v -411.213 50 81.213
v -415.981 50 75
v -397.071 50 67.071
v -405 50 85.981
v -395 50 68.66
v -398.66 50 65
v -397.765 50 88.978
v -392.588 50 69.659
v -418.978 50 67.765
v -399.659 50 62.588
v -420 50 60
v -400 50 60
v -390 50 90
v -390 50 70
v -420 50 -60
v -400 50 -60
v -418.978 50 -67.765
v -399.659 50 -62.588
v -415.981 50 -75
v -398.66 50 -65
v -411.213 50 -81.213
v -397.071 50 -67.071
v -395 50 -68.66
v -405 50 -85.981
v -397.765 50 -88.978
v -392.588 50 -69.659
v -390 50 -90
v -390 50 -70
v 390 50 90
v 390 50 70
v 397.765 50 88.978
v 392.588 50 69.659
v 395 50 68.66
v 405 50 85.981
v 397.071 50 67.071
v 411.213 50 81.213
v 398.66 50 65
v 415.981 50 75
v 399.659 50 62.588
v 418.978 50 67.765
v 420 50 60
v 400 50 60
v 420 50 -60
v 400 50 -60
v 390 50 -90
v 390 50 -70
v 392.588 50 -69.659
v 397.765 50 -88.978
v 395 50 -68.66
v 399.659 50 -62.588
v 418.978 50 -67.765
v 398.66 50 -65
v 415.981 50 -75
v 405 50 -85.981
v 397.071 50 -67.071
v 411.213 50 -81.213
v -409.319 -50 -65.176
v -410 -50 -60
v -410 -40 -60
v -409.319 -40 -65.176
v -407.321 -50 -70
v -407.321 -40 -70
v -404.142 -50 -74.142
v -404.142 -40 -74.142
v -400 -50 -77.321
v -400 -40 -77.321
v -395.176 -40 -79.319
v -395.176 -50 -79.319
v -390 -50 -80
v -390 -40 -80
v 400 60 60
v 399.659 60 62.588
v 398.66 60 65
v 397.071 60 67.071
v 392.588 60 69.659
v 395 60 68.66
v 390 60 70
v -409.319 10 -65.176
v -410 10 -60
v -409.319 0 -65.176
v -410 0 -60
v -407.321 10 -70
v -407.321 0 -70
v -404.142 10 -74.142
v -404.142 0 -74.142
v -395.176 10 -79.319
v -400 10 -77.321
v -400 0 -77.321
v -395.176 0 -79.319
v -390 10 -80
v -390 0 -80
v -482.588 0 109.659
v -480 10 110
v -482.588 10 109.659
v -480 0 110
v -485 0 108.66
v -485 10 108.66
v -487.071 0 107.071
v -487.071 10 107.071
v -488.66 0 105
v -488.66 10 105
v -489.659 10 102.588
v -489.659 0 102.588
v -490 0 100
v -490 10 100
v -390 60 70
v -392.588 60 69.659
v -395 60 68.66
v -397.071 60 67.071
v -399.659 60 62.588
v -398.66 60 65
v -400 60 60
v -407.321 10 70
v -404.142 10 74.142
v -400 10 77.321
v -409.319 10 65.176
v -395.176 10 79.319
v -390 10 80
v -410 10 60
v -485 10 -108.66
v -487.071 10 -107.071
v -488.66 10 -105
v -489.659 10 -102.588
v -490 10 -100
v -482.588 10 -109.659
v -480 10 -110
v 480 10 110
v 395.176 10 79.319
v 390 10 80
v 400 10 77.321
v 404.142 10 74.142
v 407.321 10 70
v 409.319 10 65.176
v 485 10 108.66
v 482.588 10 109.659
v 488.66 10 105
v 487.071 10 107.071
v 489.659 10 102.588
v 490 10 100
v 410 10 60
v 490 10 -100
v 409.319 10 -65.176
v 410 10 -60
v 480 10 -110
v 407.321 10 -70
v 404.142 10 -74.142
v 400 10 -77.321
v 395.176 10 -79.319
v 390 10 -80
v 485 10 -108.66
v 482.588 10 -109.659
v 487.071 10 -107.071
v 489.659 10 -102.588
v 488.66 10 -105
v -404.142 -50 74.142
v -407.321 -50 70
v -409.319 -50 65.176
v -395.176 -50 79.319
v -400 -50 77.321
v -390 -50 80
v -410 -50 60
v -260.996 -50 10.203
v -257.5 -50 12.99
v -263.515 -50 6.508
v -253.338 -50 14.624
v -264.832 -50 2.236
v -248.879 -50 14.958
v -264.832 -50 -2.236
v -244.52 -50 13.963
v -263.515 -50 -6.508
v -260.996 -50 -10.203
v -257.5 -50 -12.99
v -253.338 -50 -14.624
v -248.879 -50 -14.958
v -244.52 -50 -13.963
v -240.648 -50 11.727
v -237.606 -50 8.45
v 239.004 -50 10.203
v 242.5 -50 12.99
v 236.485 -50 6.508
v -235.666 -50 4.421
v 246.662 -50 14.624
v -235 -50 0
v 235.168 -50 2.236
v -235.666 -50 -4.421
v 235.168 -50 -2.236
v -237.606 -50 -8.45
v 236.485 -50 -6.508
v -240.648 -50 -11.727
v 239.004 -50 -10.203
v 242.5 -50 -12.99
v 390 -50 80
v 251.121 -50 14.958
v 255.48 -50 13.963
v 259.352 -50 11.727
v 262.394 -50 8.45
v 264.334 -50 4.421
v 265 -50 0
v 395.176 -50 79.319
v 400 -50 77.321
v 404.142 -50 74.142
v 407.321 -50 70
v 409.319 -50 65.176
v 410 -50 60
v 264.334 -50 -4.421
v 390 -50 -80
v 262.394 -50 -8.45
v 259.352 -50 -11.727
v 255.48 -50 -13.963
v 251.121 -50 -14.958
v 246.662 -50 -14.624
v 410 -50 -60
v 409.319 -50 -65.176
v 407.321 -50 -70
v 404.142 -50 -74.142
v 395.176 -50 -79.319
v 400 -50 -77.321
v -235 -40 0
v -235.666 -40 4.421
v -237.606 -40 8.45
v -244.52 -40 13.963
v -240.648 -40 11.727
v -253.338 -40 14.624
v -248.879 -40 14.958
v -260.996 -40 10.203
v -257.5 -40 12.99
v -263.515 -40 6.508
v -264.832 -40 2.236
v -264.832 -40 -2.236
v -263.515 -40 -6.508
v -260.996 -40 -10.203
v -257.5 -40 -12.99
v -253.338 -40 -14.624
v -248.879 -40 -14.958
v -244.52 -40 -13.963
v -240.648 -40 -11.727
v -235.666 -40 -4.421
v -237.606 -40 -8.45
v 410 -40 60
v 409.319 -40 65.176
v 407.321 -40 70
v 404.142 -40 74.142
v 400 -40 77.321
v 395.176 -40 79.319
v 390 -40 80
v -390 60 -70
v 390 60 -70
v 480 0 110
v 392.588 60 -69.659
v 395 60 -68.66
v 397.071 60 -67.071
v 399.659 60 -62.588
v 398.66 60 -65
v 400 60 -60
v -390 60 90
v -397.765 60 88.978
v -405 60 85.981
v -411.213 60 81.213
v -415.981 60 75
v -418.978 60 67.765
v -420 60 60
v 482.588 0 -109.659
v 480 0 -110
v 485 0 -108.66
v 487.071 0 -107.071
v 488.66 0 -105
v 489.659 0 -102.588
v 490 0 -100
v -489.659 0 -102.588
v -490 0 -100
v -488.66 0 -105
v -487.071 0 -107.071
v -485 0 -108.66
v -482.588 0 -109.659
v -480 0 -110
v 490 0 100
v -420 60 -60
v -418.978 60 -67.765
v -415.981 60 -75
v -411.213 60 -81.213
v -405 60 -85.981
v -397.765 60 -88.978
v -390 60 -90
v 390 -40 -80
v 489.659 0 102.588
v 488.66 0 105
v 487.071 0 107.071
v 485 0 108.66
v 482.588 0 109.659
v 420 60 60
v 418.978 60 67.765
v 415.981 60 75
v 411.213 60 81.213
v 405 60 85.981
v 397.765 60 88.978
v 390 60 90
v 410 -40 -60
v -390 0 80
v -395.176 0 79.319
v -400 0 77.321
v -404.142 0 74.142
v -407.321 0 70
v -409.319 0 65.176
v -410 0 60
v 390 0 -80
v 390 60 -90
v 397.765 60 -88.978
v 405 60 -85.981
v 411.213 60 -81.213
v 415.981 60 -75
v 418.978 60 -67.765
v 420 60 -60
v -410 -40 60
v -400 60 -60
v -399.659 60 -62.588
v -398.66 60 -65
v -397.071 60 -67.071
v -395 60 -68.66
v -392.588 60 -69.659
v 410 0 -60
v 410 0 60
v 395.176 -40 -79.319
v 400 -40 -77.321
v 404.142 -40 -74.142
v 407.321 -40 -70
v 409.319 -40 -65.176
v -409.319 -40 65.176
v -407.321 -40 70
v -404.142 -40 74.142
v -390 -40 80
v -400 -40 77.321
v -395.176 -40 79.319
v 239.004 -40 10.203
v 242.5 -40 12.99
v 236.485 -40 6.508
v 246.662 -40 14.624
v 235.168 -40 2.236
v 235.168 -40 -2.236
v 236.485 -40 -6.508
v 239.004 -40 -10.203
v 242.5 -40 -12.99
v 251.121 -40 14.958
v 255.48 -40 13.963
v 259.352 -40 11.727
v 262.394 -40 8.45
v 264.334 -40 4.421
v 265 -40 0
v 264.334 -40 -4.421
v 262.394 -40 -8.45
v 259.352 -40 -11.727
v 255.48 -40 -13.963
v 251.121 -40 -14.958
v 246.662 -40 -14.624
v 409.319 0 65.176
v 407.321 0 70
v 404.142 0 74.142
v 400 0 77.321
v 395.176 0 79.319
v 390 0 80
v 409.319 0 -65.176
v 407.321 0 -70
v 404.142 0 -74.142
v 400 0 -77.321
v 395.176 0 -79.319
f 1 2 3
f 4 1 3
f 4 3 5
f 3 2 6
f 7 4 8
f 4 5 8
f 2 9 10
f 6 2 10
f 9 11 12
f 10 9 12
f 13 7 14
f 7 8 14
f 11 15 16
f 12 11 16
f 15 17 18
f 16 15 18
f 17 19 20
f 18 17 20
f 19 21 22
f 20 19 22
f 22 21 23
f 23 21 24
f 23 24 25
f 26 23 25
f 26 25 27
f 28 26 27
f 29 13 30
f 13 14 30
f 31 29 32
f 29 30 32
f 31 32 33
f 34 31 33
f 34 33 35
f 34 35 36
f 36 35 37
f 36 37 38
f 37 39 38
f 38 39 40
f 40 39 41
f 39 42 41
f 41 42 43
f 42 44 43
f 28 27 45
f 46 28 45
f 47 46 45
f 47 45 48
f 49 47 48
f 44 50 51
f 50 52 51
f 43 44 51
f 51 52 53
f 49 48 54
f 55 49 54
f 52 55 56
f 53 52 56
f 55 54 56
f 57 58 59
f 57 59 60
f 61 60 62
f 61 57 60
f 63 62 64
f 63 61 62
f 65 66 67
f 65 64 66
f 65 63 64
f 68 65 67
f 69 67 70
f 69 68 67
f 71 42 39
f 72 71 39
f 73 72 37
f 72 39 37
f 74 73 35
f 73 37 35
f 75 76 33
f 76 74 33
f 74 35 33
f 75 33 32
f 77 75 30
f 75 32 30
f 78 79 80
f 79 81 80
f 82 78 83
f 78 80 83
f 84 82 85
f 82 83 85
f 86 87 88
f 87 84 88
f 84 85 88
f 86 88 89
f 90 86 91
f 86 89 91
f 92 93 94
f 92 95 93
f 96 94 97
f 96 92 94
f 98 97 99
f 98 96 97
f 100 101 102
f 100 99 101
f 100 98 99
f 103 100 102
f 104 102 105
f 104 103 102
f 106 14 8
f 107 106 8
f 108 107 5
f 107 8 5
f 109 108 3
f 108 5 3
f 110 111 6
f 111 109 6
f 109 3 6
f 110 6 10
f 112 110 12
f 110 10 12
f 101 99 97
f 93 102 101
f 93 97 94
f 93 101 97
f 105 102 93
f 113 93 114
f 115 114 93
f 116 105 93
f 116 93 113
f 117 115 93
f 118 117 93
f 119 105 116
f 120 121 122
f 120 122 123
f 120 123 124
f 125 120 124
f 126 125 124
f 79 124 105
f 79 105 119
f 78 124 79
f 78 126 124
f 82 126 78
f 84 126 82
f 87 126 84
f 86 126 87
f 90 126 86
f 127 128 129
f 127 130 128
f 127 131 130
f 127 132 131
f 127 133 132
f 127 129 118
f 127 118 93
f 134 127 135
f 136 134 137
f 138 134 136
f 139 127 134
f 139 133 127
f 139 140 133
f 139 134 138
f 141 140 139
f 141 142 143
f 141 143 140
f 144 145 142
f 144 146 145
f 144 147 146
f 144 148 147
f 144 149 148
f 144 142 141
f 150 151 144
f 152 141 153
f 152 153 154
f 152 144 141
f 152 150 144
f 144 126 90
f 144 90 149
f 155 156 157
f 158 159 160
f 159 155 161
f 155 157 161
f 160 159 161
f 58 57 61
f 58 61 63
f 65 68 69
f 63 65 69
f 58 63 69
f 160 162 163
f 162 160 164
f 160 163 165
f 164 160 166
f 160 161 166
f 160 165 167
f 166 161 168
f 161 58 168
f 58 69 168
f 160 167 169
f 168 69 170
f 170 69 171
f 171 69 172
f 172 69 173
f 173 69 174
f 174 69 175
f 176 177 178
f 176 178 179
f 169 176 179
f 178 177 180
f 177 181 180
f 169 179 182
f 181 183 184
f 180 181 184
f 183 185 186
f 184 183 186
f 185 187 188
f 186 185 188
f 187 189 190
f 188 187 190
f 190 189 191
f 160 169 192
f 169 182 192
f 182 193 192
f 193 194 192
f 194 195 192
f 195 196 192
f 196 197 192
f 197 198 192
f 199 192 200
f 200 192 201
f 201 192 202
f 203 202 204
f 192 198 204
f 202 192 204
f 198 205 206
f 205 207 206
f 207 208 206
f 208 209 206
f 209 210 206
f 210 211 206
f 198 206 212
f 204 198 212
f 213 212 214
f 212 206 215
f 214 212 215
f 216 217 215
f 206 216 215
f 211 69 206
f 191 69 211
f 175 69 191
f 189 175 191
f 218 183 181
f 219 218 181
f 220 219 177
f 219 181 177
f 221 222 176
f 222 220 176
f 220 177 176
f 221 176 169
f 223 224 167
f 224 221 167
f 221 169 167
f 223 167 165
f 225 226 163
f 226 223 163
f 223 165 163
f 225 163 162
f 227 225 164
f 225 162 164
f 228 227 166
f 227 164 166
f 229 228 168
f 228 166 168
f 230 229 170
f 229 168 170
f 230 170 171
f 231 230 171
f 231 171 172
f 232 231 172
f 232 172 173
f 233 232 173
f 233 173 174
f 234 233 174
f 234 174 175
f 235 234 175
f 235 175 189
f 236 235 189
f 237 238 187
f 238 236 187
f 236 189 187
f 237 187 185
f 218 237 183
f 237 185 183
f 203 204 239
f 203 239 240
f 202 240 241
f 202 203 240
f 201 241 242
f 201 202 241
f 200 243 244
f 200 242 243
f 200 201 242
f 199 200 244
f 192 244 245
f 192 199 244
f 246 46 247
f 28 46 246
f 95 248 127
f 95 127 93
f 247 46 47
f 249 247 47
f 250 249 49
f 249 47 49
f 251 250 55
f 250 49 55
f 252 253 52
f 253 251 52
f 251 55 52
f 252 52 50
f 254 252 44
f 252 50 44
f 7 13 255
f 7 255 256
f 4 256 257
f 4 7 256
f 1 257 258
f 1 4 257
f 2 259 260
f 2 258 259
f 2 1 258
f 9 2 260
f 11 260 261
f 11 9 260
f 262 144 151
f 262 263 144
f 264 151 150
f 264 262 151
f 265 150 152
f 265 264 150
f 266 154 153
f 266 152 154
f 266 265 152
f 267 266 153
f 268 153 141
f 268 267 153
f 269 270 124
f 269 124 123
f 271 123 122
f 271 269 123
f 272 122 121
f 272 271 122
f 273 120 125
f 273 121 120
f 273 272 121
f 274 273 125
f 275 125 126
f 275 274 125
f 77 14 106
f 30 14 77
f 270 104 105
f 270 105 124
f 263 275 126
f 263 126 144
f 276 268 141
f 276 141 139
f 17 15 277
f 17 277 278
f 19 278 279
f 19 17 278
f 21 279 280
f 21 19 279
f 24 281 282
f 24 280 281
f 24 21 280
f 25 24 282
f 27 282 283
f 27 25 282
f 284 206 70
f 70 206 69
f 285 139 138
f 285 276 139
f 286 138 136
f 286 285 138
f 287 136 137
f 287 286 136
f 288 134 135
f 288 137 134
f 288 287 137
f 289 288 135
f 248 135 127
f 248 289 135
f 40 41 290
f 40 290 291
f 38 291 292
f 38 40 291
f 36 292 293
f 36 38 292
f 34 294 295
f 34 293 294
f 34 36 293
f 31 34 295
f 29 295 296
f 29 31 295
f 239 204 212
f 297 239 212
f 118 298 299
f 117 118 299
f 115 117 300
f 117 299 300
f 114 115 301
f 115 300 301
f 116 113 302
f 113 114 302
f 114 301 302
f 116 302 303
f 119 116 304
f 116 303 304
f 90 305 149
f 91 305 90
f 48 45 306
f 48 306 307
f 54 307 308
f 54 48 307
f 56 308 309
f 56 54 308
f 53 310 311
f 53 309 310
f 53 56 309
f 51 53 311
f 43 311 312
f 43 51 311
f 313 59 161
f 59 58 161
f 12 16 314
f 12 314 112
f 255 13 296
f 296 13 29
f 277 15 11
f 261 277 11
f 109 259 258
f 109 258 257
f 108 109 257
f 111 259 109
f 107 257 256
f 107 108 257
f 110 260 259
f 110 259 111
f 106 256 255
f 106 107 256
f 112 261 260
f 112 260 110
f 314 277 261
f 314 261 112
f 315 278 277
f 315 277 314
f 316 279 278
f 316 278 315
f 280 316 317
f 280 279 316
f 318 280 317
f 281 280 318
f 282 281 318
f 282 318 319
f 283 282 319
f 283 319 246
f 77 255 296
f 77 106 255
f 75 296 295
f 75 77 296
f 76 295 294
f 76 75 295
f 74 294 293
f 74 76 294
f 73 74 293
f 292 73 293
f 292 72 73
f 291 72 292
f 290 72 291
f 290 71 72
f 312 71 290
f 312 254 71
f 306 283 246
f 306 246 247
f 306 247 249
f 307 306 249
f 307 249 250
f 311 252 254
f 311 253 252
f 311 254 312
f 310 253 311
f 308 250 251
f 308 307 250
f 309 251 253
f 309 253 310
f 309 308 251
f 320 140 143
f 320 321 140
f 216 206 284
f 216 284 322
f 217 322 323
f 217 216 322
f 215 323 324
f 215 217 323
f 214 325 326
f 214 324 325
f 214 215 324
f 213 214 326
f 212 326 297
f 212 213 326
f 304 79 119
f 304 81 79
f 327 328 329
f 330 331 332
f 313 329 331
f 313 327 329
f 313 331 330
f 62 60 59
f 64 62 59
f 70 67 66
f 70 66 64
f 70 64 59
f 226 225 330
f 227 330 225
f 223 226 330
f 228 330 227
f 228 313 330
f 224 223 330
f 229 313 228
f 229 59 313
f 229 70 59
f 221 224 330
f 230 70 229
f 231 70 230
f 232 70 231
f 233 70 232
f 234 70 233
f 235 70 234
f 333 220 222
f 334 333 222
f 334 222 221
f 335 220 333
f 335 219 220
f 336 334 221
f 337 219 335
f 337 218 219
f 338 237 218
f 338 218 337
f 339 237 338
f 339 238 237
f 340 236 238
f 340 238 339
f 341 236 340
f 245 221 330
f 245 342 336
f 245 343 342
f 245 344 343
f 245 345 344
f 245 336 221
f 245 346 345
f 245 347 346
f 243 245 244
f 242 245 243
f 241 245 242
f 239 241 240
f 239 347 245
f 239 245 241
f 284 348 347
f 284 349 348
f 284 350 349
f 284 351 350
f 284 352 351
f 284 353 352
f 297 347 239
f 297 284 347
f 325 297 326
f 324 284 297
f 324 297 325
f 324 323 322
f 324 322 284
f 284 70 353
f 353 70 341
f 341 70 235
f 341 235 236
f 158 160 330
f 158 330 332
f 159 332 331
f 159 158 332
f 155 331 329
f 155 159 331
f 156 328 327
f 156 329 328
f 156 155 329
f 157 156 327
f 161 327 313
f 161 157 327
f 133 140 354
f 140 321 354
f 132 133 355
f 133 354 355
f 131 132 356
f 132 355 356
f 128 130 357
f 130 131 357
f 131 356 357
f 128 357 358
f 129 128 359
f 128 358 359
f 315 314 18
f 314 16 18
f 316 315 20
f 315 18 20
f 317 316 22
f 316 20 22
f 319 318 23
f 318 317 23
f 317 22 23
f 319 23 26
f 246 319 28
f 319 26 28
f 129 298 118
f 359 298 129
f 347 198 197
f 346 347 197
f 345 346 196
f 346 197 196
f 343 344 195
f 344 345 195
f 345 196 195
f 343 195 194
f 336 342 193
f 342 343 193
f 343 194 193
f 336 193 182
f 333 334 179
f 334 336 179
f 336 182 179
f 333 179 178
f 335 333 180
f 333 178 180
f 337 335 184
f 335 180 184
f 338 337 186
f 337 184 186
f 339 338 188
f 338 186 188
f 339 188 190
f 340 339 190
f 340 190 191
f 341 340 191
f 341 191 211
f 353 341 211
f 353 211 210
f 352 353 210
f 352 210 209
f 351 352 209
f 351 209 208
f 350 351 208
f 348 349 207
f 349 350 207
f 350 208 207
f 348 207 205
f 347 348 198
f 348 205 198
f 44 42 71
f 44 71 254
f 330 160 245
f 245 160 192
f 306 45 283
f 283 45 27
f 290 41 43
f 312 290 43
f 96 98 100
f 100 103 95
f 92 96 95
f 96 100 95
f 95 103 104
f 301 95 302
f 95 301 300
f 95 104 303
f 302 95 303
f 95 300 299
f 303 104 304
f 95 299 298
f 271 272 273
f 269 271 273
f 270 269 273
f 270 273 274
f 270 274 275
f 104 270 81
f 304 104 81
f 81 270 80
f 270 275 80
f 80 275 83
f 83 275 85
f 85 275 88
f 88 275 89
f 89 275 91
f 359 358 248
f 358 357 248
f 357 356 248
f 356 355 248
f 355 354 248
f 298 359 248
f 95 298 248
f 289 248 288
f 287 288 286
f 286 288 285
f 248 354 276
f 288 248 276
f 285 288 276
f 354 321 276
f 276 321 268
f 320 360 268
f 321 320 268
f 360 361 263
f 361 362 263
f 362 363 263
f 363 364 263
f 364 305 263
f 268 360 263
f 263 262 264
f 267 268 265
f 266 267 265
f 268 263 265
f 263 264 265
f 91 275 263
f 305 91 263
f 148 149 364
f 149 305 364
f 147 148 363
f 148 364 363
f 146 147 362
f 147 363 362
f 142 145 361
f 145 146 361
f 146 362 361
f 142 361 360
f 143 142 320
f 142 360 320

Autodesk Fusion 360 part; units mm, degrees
sketch "Sketch1" plane through (0, 0, 0) normal (0, 1, 0) x (1, 0, 0)
  line L0 (480, -110) -> (-480, -110)
  line L1 (-490, -100) -> (-490, 100)
  line L2 (-480, 110) -> (480, 110)
  line L3 (490, 100) -> (490, -100)
  line L4 (490, -110) -> (-490, 110) construction
  line L5 (-490, -110) -> (490, 110) construction
  arc A0 (480, -110) -> (490, -100) centre (480, -100) ccw
  arc A1 (490, 100) -> (480, 110) centre (480, 100) ccw
  arc A2 (-480, 110) -> (-490, 100) centre (-480, 100) ccw
  arc A3 (-490, -100) -> (-480, -110) centre (-480, -100) ccw
  line L6 (390, 80) -> (-390, 80)
  line L7 (-410, 60) -> (-410, -60)
  line L8 (-390, -80) -> (390, -80)
  line L9 (410, -60) -> (410, 60)
  line L10 (410, 80) -> (-410, -80) construction
  line L11 (-410, 80) -> (410, -80) construction
  arc A4 (390, -80) -> (410, -60) centre (390, -60) ccw
  arc A5 (410, 60) -> (390, 80) centre (390, 60) ccw
  arc A6 (-390, 80) -> (-410, 60) centre (-390, 60) ccw
  arc A7 (-410, -60) -> (-390, -80) centre (-390, -60) ccw
  line L12 (-650, 0) -> (650, 0) construction
  line L13 (0, -300) -> (0, 250) construction
  circle A8 centre (250, 0) radius 15
  circle A9 centre (-250, 0) radius 15
  arc A10 (420, 60) -> (390, 90) centre (390, 60) ccw
  line L14 (390, 90) -> (-390, 90)
  arc A11 (-390, 90) -> (-420, 60) centre (-390, 60) ccw
  line L15 (-420, 60) -> (-420, -60)
  arc A12 (-420, -60) -> (-390, -90) centre (-390, -60) ccw
  line L16 (-390, -90) -> (390, -90)
  arc A13 (390, -90) -> (420, -60) centre (390, -60) ccw
  line L17 (420, -60) -> (420, 60)
  arc A14 (400, 60) -> (390, 70) centre (390, 60) ccw
  line L18 (390, 70) -> (-390, 70)
  arc A15 (-390, 70) -> (-400, 60) centre (-390, 60) ccw
  line L19 (-400, 60) -> (-400, -60)
  arc A16 (-400, -60) -> (-390, -70) centre (-390, -60) ccw
  line L20 (-390, -70) -> (390, -70)
  arc A17 (390, -70) -> (400, -60) centre (390, -60) ccw
  line L21 (400, -60) -> (400, 60)
  dimension "d1" = 980
  dimension "d2" = 220
  dimension "d3" = 10
  dimension "d4" = 10
  dimension "d5" = 10
  dimension "d6" = 10
  dimension "d7" = 820
  dimension "d8" = 160
  dimension "d9" = 20
  dimension "d10" = 20
  dimension "d11" = 20
  dimension "d12" = 20
  dimension "d15" = 1300
  dimension "d16" = 550
  dimension "d17" = 30
  dimension "d18" = 80
  dimension "d19" = 250
  dimension "d23" = 10
  dimension "d24" = -10
extrude "Extrude1" add sketch "Sketch1" along normal blind 10 contours L0 L1 L2 L3 A0 A1 A2 A3 | A10 L14 A11 L15 A12 L16 A13 L17 makes body 1 in component "Frame"
extrude "Extrude1'" add sketch "Sketch1" along normal blind 10 from surface at -50 separate body contours L6 L7 L8 L9 A4 A5 A6 A7 | A14 L18 A15 L19 A16 L20 A17 L21 makes body 2 in component "Door"
extrude "Extrude1''" add sketch "Sketch1" along normal blind 10 from surface at 50 separate body contours L6 L7 L8 L9 A4 A5 A6 A7 | A10 L14 A11 L15 A12 L16 A13 L17 makes body 3 in component "Rim"
component "Frame" placed x (1, 0, 0) y (0, 1, 0) z (0, 0, 1) at (0, 0, 0)
component "Door" placed x (1, 0, 0) y (0, 1, 0) z (0, 0, 1) at (0, 0, 0)
component "Rim" placed x (1, 0, 0) y (0, 1, 0) z (0, 0, 1) at (0, 0, 0)
